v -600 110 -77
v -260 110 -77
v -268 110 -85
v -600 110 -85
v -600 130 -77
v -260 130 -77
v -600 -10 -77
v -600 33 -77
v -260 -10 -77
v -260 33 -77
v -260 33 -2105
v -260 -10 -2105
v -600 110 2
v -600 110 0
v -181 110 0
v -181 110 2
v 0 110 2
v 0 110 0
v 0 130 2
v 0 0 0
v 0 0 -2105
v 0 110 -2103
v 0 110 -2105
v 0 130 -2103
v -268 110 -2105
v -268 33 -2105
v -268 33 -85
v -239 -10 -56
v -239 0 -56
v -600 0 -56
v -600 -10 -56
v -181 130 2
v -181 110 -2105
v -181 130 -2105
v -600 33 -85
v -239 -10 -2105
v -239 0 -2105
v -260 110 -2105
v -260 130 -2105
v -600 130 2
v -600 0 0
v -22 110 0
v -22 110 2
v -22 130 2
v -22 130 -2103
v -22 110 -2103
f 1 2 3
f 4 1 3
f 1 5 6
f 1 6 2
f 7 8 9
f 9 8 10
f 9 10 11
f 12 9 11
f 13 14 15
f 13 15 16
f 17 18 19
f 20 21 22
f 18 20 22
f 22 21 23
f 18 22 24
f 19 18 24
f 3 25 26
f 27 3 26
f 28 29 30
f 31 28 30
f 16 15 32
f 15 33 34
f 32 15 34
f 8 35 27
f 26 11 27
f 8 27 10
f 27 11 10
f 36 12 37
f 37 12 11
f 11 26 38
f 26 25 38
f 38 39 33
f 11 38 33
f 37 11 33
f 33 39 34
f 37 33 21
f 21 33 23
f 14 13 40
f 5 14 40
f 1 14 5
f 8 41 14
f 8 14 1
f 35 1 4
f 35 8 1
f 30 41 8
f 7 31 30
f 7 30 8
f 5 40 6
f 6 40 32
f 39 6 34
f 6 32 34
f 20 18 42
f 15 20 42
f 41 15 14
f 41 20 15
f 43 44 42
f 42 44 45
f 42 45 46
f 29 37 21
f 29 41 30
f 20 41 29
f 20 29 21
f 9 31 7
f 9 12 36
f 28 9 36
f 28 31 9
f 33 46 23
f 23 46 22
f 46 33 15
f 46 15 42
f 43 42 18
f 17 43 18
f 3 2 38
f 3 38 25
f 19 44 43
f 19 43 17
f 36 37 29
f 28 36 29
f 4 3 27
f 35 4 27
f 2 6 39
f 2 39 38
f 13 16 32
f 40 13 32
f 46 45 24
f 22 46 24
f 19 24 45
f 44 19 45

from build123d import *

# Parameters (mm, degrees)
F1_DEPTH = 110
F3_DEPTH = 10
F4_W     = 5.7648873329
F4_H     = 5.8702230453
F6_W     = 22
F6_H     = 20


with BuildPart() as f1:
    # F0 (on Front) → F1 (new body)
    with BuildSketch(Plane.XZ):
        Polygon((0, -2105), (0, 0), (-600, 0), (-600, -77), (-260, -77), (-260, -2105), align=None)
    extrude(amount=-F1_DEPTH)

    # F2 (on face) → F3 (join)
    with BuildSketch(Plane.XZ):
        Polygon((-239, -56), (-600, -56), (-600, -77), (-260, -77), (-260, -2105), (-239, -2105), align=None)
    extrude(amount=F3_DEPTH)

    # F5: sweep along a path in F5_path
    with BuildLine(Plane(origin=(-600, 110, -77), x_dir=(0, 0, 1), z_dir=(0, -1, 0))) as f5_path:
        Line((0, 0), (0, -340))
        Line((0, -340), (-2028, -340))
    # F4 (on face) → F5 (sweep)
    with BuildSketch(Plane(origin=(-600, 0, 0), x_dir=(0, -1, 0), z_dir=(-1, 0, 0))):
        with Locations((-107.1175563335, -74.0648884773)):
            Rectangle(F4_W, F4_H)
        Polygon((-104.2351126671, -77), (-110, -77), (-110, -85), (-33, -85), (-33, -77), align=None)
        Polygon((-130, -77), (-110, -77), (-110, -71.1297769547), (-110, 0), (-110, 2), (-130, 2), align=None)
    sweep(path=f5_path.line, transition=Transition.RIGHT)

    # F7: sweep along a path in F7_path
    with BuildLine(Plane(origin=(0, 110, 0), x_dir=(0, 0, 1), z_dir=(0, -1, 0))) as f7_path:
        Line((0, 0), (-2105, 0))
    # F6 (on face) → F7 (sweep)
    with BuildSketch(Plane.XY.offset(2)):
        with Locations((-11, 120)):
            Rectangle(F6_W, F6_H)
    sweep(path=f7_path.line)


solid = f1.part
